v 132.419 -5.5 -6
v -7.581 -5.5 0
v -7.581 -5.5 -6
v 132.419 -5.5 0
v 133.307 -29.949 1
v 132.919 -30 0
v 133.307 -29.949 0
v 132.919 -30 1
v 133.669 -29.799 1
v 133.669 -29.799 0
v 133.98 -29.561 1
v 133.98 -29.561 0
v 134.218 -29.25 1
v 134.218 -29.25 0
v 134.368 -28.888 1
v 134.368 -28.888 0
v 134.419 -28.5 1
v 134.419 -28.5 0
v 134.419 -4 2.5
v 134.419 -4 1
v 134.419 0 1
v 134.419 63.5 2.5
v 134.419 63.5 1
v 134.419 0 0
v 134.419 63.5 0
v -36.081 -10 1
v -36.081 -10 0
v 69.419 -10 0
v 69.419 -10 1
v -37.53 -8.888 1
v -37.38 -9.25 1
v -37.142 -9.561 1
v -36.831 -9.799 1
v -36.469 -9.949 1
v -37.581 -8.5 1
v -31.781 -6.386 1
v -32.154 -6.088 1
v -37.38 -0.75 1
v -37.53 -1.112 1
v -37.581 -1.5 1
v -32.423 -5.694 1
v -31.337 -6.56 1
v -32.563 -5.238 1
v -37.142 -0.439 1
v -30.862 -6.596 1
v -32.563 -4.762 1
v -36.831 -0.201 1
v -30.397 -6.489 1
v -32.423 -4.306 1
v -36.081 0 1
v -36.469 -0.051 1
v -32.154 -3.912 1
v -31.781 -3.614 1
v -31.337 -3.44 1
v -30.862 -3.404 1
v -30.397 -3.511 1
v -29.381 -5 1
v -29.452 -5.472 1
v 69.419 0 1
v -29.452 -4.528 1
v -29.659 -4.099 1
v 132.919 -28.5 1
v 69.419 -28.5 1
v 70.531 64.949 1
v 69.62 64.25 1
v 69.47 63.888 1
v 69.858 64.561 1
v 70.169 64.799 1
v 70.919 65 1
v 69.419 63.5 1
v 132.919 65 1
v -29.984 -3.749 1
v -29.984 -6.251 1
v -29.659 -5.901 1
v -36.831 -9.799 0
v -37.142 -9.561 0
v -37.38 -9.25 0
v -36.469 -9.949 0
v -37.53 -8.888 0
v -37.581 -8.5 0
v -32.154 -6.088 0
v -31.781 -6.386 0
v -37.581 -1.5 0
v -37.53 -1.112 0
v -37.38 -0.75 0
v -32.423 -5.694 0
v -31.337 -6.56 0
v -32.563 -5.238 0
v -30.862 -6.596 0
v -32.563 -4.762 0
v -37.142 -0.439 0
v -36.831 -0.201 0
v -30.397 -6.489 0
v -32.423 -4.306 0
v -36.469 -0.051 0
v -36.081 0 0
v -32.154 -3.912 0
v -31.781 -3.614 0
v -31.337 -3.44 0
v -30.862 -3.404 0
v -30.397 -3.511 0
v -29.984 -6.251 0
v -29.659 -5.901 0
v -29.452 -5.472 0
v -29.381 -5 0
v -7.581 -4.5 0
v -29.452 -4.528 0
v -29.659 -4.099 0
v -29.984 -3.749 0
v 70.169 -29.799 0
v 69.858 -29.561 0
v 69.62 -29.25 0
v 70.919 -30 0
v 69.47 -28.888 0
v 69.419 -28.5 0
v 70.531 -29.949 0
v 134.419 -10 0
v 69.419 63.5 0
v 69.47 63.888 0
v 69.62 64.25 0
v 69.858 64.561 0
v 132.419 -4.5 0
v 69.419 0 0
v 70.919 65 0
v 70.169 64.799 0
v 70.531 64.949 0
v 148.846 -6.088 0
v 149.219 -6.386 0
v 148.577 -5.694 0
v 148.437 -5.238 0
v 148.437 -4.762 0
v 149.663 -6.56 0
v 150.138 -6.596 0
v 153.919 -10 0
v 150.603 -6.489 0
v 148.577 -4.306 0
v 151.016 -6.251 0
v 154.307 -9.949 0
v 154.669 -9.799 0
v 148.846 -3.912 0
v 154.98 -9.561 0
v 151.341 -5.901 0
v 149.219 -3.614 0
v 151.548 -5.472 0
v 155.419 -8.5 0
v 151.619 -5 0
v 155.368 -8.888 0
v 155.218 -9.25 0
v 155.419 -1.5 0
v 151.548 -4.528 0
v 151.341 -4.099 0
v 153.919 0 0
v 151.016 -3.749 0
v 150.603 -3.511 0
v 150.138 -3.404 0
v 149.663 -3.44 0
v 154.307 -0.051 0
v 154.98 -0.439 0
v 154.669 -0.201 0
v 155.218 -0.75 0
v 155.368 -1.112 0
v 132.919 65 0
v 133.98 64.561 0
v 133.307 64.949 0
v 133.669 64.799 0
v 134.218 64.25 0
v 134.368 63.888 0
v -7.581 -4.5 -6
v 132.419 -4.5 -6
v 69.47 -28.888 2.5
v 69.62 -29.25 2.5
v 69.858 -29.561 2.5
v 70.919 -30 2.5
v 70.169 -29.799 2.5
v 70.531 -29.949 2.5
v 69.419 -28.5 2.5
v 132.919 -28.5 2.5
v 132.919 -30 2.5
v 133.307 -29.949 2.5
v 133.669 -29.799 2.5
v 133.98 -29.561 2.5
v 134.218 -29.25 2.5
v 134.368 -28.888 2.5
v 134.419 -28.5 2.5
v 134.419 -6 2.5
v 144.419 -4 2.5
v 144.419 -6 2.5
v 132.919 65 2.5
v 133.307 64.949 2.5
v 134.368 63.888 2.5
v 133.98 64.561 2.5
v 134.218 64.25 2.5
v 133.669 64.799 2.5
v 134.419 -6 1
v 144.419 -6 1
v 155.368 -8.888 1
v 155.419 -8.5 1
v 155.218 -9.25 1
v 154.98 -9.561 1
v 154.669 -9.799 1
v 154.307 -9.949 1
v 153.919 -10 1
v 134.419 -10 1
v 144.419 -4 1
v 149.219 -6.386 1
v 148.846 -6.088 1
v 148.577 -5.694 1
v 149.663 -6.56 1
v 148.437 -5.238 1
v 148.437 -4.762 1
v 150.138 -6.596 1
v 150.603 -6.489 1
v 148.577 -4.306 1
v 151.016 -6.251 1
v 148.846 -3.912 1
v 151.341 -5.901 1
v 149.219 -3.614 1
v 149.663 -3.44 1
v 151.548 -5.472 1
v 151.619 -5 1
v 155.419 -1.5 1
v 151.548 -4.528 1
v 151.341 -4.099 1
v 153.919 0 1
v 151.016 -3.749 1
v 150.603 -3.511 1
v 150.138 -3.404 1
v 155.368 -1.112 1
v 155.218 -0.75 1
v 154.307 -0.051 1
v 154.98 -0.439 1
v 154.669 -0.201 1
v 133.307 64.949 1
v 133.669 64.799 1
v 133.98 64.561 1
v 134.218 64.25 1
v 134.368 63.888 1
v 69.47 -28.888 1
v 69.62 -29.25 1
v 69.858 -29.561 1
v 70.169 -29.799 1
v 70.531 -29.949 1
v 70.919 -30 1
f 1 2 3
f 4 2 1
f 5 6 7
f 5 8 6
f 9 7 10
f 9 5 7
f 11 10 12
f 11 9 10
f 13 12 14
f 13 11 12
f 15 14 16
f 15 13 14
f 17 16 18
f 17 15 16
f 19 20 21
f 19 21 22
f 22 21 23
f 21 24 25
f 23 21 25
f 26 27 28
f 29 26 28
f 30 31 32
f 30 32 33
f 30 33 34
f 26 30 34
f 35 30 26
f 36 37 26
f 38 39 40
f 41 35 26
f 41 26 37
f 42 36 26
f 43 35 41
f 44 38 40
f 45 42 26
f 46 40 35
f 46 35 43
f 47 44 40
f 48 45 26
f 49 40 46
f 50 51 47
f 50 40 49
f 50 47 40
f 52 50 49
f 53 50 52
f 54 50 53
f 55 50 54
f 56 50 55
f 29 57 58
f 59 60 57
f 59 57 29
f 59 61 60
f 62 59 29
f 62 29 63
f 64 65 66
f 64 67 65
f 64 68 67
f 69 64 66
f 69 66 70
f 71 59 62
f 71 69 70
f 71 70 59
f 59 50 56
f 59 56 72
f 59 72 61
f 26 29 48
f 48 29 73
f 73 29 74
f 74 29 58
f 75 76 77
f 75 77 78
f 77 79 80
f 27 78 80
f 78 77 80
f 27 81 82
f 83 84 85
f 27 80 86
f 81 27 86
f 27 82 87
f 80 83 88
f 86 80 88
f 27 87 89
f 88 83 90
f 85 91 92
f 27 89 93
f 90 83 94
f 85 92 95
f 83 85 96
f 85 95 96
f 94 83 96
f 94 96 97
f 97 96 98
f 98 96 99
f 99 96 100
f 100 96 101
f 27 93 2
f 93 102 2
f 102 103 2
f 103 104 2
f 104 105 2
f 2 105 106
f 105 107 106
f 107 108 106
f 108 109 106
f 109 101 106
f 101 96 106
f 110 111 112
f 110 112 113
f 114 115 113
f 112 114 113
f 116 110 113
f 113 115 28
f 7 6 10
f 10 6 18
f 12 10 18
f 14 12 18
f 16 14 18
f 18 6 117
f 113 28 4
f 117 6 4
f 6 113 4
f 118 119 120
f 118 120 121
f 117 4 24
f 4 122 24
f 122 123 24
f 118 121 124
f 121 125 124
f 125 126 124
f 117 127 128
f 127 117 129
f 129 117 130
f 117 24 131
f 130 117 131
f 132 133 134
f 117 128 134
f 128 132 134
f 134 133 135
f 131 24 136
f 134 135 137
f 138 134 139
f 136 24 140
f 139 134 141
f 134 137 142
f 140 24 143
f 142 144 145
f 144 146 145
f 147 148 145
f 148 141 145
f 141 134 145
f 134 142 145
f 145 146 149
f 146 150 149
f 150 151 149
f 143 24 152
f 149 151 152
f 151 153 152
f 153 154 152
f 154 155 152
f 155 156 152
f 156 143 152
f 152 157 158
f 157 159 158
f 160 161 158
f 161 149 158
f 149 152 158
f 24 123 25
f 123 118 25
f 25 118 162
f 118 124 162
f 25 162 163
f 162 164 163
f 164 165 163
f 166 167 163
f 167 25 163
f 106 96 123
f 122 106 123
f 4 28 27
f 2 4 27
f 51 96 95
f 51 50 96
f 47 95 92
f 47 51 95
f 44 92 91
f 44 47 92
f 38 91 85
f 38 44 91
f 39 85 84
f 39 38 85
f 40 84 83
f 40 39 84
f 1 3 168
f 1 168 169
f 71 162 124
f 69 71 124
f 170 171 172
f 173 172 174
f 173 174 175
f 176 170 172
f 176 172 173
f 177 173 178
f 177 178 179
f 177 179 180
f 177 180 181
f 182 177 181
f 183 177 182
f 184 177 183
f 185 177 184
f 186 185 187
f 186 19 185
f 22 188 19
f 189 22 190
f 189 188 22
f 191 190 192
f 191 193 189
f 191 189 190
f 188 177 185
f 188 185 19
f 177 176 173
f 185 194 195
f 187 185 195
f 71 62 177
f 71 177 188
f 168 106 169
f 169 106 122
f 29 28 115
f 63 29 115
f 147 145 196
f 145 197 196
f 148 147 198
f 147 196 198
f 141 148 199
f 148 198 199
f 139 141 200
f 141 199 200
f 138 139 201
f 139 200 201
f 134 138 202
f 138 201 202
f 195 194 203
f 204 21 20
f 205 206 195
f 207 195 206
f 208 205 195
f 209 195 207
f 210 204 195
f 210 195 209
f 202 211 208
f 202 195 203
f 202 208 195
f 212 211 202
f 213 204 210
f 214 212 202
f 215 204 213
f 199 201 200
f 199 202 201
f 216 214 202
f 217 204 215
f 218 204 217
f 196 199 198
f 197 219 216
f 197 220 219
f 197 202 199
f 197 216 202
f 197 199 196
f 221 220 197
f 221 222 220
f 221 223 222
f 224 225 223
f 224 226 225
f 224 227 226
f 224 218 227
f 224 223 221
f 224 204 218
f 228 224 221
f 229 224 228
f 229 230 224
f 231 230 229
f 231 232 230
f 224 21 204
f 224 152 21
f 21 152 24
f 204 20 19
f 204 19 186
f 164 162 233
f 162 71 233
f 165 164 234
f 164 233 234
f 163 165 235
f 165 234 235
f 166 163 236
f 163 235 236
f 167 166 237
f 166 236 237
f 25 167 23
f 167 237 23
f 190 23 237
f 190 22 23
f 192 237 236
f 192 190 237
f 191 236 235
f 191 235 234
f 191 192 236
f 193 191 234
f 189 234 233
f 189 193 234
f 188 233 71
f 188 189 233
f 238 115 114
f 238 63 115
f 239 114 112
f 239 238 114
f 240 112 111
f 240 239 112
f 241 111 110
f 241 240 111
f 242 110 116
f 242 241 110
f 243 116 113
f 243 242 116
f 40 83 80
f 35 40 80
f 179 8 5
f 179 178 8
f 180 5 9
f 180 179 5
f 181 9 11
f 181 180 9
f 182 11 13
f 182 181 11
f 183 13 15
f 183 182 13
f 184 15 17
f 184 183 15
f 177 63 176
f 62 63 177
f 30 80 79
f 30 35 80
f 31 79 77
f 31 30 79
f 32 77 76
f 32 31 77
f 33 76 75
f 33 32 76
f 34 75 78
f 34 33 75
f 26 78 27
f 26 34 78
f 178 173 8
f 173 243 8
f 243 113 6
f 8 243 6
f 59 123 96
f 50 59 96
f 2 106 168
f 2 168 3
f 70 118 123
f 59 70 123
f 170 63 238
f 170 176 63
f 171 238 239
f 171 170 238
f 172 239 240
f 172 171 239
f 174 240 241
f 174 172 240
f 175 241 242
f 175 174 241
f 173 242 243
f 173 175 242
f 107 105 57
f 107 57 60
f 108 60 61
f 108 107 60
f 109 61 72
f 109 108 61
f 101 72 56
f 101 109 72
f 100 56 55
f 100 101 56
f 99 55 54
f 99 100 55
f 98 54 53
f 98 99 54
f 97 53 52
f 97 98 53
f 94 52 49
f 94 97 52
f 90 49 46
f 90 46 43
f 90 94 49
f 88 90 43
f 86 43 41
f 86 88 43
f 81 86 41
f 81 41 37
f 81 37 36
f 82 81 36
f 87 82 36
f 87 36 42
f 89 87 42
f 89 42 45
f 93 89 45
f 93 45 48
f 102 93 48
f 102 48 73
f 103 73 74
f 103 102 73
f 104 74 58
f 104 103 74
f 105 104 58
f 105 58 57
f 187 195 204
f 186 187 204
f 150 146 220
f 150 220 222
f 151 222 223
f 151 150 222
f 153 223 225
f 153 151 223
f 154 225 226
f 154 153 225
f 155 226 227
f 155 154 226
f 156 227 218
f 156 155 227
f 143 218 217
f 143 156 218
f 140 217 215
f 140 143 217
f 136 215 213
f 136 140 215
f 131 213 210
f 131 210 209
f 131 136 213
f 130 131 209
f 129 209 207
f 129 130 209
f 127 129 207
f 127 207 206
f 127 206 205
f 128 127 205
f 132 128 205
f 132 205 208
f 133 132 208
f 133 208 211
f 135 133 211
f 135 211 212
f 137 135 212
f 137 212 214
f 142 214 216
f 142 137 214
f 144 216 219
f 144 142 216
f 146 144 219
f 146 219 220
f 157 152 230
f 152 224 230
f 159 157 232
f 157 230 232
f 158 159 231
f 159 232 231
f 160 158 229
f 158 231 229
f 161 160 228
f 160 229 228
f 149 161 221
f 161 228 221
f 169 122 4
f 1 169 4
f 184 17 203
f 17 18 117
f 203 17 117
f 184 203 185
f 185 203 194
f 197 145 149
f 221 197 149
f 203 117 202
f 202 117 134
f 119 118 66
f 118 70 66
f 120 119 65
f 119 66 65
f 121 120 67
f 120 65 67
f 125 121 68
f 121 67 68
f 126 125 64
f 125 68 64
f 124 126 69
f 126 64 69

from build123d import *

# Parameters (mm, degrees)
F0_R     = 1.6
F1_DEPTH = 1
F2_R     = 1.5
F3_W     = 140
F3_H     = 1
F4_DEPTH = 6
F5_W     = 63.5
F5_H     = 1.5
F5_W_2   = 1.5
F5_H_2   = 93.5
F6_DEPTH = 1.5
F7_R     = 1.4999
F8_W     = 10
F8_H     = 2
F9_DEPTH = 1.5


# Not quite as in the source:
# - a fillet or chamfer is up to 0.001 mm smaller than in the source, because OpenCascade refuses the exact size


with BuildPart() as f1:
    # F0 (on Top) → F1 (new body)
    with BuildSketch(Plane.XY):
        Polygon((69.4188682817, 0), (-37.5811317183, 0), (-37.5811317183, -10), (69.4188682817, -10), (69.4188682817, -30), (134.4188682817, -30), (134.4188682817, -10), (155.4188682817, -10), (155.4188682817, 0), (134.4188682817, 0), (134.4188682817, 65), (69.4188682817, 65), align=None)
        with Locations((-30.9811317183, -5)):
            Circle(F0_R, mode=Mode.SUBTRACT)
        with Locations((150.0188682817, -5)):
            Circle(F0_R, mode=Mode.SUBTRACT)
    extrude(amount=F1_DEPTH)

    # F2
    f2_edges = [f1.edges().sort_by_distance(p)[0] for p in [
        (-37.581132, 0, 0.5),
        (-37.581132, -10, 0.5),
        (155.418868, 0, 0.5),
        (155.418868, -10, 0.5),
        (134.418868, -30, 0.5),
        (69.418868, -30, 0.5),
        (69.418868, 65, 0.5),
        (134.418868, 65, 0.5),
    ]]
    fillet(f2_edges, radius=F2_R)

    # F3 (on face) → F4 (join)
    with BuildSketch(Plane(origin=(0, 0, 0), x_dir=(1, 0, 0), z_dir=(0, 0, -1))):
        with Locations((62.4188682817, 5)):
            Rectangle(F3_W, F3_H)
    extrude(amount=F4_DEPTH)

    # F5 (on face) → F6 (join)
    with BuildSketch(Plane.XY.offset(1)):
        with Locations((101.1688682817, -29.25)):
            Rectangle(F5_W, F5_H)
        with Locations((133.6688682817, 18.25)):
            Rectangle(F5_W_2, F5_H_2)
        with Locations((133.6688682817, -29.25)):
            Rectangle(F5_W_2, F5_H)
    extrude(amount=F6_DEPTH)

    # F7 (radius 1.5 in the source; OpenCascade refuses exactly that, so slightly less here)
    f7_edges = [f1.edges().sort_by_distance(p)[0] for p in [
        (134.418868, -30, 1.75),
        (69.418868, -30, 1.75),
        (134.418868, 65, 1.75),
    ]]
    fillet(f7_edges, radius=F7_R)

    # F8 (on face) → F9 (join, through all)
    with BuildSketch(Plane.XY.offset(1)):
        with Locations((139.4188682817, -5)):
            Rectangle(F8_W, F8_H)
    extrude(amount=F9_DEPTH)


solid = f1.part
